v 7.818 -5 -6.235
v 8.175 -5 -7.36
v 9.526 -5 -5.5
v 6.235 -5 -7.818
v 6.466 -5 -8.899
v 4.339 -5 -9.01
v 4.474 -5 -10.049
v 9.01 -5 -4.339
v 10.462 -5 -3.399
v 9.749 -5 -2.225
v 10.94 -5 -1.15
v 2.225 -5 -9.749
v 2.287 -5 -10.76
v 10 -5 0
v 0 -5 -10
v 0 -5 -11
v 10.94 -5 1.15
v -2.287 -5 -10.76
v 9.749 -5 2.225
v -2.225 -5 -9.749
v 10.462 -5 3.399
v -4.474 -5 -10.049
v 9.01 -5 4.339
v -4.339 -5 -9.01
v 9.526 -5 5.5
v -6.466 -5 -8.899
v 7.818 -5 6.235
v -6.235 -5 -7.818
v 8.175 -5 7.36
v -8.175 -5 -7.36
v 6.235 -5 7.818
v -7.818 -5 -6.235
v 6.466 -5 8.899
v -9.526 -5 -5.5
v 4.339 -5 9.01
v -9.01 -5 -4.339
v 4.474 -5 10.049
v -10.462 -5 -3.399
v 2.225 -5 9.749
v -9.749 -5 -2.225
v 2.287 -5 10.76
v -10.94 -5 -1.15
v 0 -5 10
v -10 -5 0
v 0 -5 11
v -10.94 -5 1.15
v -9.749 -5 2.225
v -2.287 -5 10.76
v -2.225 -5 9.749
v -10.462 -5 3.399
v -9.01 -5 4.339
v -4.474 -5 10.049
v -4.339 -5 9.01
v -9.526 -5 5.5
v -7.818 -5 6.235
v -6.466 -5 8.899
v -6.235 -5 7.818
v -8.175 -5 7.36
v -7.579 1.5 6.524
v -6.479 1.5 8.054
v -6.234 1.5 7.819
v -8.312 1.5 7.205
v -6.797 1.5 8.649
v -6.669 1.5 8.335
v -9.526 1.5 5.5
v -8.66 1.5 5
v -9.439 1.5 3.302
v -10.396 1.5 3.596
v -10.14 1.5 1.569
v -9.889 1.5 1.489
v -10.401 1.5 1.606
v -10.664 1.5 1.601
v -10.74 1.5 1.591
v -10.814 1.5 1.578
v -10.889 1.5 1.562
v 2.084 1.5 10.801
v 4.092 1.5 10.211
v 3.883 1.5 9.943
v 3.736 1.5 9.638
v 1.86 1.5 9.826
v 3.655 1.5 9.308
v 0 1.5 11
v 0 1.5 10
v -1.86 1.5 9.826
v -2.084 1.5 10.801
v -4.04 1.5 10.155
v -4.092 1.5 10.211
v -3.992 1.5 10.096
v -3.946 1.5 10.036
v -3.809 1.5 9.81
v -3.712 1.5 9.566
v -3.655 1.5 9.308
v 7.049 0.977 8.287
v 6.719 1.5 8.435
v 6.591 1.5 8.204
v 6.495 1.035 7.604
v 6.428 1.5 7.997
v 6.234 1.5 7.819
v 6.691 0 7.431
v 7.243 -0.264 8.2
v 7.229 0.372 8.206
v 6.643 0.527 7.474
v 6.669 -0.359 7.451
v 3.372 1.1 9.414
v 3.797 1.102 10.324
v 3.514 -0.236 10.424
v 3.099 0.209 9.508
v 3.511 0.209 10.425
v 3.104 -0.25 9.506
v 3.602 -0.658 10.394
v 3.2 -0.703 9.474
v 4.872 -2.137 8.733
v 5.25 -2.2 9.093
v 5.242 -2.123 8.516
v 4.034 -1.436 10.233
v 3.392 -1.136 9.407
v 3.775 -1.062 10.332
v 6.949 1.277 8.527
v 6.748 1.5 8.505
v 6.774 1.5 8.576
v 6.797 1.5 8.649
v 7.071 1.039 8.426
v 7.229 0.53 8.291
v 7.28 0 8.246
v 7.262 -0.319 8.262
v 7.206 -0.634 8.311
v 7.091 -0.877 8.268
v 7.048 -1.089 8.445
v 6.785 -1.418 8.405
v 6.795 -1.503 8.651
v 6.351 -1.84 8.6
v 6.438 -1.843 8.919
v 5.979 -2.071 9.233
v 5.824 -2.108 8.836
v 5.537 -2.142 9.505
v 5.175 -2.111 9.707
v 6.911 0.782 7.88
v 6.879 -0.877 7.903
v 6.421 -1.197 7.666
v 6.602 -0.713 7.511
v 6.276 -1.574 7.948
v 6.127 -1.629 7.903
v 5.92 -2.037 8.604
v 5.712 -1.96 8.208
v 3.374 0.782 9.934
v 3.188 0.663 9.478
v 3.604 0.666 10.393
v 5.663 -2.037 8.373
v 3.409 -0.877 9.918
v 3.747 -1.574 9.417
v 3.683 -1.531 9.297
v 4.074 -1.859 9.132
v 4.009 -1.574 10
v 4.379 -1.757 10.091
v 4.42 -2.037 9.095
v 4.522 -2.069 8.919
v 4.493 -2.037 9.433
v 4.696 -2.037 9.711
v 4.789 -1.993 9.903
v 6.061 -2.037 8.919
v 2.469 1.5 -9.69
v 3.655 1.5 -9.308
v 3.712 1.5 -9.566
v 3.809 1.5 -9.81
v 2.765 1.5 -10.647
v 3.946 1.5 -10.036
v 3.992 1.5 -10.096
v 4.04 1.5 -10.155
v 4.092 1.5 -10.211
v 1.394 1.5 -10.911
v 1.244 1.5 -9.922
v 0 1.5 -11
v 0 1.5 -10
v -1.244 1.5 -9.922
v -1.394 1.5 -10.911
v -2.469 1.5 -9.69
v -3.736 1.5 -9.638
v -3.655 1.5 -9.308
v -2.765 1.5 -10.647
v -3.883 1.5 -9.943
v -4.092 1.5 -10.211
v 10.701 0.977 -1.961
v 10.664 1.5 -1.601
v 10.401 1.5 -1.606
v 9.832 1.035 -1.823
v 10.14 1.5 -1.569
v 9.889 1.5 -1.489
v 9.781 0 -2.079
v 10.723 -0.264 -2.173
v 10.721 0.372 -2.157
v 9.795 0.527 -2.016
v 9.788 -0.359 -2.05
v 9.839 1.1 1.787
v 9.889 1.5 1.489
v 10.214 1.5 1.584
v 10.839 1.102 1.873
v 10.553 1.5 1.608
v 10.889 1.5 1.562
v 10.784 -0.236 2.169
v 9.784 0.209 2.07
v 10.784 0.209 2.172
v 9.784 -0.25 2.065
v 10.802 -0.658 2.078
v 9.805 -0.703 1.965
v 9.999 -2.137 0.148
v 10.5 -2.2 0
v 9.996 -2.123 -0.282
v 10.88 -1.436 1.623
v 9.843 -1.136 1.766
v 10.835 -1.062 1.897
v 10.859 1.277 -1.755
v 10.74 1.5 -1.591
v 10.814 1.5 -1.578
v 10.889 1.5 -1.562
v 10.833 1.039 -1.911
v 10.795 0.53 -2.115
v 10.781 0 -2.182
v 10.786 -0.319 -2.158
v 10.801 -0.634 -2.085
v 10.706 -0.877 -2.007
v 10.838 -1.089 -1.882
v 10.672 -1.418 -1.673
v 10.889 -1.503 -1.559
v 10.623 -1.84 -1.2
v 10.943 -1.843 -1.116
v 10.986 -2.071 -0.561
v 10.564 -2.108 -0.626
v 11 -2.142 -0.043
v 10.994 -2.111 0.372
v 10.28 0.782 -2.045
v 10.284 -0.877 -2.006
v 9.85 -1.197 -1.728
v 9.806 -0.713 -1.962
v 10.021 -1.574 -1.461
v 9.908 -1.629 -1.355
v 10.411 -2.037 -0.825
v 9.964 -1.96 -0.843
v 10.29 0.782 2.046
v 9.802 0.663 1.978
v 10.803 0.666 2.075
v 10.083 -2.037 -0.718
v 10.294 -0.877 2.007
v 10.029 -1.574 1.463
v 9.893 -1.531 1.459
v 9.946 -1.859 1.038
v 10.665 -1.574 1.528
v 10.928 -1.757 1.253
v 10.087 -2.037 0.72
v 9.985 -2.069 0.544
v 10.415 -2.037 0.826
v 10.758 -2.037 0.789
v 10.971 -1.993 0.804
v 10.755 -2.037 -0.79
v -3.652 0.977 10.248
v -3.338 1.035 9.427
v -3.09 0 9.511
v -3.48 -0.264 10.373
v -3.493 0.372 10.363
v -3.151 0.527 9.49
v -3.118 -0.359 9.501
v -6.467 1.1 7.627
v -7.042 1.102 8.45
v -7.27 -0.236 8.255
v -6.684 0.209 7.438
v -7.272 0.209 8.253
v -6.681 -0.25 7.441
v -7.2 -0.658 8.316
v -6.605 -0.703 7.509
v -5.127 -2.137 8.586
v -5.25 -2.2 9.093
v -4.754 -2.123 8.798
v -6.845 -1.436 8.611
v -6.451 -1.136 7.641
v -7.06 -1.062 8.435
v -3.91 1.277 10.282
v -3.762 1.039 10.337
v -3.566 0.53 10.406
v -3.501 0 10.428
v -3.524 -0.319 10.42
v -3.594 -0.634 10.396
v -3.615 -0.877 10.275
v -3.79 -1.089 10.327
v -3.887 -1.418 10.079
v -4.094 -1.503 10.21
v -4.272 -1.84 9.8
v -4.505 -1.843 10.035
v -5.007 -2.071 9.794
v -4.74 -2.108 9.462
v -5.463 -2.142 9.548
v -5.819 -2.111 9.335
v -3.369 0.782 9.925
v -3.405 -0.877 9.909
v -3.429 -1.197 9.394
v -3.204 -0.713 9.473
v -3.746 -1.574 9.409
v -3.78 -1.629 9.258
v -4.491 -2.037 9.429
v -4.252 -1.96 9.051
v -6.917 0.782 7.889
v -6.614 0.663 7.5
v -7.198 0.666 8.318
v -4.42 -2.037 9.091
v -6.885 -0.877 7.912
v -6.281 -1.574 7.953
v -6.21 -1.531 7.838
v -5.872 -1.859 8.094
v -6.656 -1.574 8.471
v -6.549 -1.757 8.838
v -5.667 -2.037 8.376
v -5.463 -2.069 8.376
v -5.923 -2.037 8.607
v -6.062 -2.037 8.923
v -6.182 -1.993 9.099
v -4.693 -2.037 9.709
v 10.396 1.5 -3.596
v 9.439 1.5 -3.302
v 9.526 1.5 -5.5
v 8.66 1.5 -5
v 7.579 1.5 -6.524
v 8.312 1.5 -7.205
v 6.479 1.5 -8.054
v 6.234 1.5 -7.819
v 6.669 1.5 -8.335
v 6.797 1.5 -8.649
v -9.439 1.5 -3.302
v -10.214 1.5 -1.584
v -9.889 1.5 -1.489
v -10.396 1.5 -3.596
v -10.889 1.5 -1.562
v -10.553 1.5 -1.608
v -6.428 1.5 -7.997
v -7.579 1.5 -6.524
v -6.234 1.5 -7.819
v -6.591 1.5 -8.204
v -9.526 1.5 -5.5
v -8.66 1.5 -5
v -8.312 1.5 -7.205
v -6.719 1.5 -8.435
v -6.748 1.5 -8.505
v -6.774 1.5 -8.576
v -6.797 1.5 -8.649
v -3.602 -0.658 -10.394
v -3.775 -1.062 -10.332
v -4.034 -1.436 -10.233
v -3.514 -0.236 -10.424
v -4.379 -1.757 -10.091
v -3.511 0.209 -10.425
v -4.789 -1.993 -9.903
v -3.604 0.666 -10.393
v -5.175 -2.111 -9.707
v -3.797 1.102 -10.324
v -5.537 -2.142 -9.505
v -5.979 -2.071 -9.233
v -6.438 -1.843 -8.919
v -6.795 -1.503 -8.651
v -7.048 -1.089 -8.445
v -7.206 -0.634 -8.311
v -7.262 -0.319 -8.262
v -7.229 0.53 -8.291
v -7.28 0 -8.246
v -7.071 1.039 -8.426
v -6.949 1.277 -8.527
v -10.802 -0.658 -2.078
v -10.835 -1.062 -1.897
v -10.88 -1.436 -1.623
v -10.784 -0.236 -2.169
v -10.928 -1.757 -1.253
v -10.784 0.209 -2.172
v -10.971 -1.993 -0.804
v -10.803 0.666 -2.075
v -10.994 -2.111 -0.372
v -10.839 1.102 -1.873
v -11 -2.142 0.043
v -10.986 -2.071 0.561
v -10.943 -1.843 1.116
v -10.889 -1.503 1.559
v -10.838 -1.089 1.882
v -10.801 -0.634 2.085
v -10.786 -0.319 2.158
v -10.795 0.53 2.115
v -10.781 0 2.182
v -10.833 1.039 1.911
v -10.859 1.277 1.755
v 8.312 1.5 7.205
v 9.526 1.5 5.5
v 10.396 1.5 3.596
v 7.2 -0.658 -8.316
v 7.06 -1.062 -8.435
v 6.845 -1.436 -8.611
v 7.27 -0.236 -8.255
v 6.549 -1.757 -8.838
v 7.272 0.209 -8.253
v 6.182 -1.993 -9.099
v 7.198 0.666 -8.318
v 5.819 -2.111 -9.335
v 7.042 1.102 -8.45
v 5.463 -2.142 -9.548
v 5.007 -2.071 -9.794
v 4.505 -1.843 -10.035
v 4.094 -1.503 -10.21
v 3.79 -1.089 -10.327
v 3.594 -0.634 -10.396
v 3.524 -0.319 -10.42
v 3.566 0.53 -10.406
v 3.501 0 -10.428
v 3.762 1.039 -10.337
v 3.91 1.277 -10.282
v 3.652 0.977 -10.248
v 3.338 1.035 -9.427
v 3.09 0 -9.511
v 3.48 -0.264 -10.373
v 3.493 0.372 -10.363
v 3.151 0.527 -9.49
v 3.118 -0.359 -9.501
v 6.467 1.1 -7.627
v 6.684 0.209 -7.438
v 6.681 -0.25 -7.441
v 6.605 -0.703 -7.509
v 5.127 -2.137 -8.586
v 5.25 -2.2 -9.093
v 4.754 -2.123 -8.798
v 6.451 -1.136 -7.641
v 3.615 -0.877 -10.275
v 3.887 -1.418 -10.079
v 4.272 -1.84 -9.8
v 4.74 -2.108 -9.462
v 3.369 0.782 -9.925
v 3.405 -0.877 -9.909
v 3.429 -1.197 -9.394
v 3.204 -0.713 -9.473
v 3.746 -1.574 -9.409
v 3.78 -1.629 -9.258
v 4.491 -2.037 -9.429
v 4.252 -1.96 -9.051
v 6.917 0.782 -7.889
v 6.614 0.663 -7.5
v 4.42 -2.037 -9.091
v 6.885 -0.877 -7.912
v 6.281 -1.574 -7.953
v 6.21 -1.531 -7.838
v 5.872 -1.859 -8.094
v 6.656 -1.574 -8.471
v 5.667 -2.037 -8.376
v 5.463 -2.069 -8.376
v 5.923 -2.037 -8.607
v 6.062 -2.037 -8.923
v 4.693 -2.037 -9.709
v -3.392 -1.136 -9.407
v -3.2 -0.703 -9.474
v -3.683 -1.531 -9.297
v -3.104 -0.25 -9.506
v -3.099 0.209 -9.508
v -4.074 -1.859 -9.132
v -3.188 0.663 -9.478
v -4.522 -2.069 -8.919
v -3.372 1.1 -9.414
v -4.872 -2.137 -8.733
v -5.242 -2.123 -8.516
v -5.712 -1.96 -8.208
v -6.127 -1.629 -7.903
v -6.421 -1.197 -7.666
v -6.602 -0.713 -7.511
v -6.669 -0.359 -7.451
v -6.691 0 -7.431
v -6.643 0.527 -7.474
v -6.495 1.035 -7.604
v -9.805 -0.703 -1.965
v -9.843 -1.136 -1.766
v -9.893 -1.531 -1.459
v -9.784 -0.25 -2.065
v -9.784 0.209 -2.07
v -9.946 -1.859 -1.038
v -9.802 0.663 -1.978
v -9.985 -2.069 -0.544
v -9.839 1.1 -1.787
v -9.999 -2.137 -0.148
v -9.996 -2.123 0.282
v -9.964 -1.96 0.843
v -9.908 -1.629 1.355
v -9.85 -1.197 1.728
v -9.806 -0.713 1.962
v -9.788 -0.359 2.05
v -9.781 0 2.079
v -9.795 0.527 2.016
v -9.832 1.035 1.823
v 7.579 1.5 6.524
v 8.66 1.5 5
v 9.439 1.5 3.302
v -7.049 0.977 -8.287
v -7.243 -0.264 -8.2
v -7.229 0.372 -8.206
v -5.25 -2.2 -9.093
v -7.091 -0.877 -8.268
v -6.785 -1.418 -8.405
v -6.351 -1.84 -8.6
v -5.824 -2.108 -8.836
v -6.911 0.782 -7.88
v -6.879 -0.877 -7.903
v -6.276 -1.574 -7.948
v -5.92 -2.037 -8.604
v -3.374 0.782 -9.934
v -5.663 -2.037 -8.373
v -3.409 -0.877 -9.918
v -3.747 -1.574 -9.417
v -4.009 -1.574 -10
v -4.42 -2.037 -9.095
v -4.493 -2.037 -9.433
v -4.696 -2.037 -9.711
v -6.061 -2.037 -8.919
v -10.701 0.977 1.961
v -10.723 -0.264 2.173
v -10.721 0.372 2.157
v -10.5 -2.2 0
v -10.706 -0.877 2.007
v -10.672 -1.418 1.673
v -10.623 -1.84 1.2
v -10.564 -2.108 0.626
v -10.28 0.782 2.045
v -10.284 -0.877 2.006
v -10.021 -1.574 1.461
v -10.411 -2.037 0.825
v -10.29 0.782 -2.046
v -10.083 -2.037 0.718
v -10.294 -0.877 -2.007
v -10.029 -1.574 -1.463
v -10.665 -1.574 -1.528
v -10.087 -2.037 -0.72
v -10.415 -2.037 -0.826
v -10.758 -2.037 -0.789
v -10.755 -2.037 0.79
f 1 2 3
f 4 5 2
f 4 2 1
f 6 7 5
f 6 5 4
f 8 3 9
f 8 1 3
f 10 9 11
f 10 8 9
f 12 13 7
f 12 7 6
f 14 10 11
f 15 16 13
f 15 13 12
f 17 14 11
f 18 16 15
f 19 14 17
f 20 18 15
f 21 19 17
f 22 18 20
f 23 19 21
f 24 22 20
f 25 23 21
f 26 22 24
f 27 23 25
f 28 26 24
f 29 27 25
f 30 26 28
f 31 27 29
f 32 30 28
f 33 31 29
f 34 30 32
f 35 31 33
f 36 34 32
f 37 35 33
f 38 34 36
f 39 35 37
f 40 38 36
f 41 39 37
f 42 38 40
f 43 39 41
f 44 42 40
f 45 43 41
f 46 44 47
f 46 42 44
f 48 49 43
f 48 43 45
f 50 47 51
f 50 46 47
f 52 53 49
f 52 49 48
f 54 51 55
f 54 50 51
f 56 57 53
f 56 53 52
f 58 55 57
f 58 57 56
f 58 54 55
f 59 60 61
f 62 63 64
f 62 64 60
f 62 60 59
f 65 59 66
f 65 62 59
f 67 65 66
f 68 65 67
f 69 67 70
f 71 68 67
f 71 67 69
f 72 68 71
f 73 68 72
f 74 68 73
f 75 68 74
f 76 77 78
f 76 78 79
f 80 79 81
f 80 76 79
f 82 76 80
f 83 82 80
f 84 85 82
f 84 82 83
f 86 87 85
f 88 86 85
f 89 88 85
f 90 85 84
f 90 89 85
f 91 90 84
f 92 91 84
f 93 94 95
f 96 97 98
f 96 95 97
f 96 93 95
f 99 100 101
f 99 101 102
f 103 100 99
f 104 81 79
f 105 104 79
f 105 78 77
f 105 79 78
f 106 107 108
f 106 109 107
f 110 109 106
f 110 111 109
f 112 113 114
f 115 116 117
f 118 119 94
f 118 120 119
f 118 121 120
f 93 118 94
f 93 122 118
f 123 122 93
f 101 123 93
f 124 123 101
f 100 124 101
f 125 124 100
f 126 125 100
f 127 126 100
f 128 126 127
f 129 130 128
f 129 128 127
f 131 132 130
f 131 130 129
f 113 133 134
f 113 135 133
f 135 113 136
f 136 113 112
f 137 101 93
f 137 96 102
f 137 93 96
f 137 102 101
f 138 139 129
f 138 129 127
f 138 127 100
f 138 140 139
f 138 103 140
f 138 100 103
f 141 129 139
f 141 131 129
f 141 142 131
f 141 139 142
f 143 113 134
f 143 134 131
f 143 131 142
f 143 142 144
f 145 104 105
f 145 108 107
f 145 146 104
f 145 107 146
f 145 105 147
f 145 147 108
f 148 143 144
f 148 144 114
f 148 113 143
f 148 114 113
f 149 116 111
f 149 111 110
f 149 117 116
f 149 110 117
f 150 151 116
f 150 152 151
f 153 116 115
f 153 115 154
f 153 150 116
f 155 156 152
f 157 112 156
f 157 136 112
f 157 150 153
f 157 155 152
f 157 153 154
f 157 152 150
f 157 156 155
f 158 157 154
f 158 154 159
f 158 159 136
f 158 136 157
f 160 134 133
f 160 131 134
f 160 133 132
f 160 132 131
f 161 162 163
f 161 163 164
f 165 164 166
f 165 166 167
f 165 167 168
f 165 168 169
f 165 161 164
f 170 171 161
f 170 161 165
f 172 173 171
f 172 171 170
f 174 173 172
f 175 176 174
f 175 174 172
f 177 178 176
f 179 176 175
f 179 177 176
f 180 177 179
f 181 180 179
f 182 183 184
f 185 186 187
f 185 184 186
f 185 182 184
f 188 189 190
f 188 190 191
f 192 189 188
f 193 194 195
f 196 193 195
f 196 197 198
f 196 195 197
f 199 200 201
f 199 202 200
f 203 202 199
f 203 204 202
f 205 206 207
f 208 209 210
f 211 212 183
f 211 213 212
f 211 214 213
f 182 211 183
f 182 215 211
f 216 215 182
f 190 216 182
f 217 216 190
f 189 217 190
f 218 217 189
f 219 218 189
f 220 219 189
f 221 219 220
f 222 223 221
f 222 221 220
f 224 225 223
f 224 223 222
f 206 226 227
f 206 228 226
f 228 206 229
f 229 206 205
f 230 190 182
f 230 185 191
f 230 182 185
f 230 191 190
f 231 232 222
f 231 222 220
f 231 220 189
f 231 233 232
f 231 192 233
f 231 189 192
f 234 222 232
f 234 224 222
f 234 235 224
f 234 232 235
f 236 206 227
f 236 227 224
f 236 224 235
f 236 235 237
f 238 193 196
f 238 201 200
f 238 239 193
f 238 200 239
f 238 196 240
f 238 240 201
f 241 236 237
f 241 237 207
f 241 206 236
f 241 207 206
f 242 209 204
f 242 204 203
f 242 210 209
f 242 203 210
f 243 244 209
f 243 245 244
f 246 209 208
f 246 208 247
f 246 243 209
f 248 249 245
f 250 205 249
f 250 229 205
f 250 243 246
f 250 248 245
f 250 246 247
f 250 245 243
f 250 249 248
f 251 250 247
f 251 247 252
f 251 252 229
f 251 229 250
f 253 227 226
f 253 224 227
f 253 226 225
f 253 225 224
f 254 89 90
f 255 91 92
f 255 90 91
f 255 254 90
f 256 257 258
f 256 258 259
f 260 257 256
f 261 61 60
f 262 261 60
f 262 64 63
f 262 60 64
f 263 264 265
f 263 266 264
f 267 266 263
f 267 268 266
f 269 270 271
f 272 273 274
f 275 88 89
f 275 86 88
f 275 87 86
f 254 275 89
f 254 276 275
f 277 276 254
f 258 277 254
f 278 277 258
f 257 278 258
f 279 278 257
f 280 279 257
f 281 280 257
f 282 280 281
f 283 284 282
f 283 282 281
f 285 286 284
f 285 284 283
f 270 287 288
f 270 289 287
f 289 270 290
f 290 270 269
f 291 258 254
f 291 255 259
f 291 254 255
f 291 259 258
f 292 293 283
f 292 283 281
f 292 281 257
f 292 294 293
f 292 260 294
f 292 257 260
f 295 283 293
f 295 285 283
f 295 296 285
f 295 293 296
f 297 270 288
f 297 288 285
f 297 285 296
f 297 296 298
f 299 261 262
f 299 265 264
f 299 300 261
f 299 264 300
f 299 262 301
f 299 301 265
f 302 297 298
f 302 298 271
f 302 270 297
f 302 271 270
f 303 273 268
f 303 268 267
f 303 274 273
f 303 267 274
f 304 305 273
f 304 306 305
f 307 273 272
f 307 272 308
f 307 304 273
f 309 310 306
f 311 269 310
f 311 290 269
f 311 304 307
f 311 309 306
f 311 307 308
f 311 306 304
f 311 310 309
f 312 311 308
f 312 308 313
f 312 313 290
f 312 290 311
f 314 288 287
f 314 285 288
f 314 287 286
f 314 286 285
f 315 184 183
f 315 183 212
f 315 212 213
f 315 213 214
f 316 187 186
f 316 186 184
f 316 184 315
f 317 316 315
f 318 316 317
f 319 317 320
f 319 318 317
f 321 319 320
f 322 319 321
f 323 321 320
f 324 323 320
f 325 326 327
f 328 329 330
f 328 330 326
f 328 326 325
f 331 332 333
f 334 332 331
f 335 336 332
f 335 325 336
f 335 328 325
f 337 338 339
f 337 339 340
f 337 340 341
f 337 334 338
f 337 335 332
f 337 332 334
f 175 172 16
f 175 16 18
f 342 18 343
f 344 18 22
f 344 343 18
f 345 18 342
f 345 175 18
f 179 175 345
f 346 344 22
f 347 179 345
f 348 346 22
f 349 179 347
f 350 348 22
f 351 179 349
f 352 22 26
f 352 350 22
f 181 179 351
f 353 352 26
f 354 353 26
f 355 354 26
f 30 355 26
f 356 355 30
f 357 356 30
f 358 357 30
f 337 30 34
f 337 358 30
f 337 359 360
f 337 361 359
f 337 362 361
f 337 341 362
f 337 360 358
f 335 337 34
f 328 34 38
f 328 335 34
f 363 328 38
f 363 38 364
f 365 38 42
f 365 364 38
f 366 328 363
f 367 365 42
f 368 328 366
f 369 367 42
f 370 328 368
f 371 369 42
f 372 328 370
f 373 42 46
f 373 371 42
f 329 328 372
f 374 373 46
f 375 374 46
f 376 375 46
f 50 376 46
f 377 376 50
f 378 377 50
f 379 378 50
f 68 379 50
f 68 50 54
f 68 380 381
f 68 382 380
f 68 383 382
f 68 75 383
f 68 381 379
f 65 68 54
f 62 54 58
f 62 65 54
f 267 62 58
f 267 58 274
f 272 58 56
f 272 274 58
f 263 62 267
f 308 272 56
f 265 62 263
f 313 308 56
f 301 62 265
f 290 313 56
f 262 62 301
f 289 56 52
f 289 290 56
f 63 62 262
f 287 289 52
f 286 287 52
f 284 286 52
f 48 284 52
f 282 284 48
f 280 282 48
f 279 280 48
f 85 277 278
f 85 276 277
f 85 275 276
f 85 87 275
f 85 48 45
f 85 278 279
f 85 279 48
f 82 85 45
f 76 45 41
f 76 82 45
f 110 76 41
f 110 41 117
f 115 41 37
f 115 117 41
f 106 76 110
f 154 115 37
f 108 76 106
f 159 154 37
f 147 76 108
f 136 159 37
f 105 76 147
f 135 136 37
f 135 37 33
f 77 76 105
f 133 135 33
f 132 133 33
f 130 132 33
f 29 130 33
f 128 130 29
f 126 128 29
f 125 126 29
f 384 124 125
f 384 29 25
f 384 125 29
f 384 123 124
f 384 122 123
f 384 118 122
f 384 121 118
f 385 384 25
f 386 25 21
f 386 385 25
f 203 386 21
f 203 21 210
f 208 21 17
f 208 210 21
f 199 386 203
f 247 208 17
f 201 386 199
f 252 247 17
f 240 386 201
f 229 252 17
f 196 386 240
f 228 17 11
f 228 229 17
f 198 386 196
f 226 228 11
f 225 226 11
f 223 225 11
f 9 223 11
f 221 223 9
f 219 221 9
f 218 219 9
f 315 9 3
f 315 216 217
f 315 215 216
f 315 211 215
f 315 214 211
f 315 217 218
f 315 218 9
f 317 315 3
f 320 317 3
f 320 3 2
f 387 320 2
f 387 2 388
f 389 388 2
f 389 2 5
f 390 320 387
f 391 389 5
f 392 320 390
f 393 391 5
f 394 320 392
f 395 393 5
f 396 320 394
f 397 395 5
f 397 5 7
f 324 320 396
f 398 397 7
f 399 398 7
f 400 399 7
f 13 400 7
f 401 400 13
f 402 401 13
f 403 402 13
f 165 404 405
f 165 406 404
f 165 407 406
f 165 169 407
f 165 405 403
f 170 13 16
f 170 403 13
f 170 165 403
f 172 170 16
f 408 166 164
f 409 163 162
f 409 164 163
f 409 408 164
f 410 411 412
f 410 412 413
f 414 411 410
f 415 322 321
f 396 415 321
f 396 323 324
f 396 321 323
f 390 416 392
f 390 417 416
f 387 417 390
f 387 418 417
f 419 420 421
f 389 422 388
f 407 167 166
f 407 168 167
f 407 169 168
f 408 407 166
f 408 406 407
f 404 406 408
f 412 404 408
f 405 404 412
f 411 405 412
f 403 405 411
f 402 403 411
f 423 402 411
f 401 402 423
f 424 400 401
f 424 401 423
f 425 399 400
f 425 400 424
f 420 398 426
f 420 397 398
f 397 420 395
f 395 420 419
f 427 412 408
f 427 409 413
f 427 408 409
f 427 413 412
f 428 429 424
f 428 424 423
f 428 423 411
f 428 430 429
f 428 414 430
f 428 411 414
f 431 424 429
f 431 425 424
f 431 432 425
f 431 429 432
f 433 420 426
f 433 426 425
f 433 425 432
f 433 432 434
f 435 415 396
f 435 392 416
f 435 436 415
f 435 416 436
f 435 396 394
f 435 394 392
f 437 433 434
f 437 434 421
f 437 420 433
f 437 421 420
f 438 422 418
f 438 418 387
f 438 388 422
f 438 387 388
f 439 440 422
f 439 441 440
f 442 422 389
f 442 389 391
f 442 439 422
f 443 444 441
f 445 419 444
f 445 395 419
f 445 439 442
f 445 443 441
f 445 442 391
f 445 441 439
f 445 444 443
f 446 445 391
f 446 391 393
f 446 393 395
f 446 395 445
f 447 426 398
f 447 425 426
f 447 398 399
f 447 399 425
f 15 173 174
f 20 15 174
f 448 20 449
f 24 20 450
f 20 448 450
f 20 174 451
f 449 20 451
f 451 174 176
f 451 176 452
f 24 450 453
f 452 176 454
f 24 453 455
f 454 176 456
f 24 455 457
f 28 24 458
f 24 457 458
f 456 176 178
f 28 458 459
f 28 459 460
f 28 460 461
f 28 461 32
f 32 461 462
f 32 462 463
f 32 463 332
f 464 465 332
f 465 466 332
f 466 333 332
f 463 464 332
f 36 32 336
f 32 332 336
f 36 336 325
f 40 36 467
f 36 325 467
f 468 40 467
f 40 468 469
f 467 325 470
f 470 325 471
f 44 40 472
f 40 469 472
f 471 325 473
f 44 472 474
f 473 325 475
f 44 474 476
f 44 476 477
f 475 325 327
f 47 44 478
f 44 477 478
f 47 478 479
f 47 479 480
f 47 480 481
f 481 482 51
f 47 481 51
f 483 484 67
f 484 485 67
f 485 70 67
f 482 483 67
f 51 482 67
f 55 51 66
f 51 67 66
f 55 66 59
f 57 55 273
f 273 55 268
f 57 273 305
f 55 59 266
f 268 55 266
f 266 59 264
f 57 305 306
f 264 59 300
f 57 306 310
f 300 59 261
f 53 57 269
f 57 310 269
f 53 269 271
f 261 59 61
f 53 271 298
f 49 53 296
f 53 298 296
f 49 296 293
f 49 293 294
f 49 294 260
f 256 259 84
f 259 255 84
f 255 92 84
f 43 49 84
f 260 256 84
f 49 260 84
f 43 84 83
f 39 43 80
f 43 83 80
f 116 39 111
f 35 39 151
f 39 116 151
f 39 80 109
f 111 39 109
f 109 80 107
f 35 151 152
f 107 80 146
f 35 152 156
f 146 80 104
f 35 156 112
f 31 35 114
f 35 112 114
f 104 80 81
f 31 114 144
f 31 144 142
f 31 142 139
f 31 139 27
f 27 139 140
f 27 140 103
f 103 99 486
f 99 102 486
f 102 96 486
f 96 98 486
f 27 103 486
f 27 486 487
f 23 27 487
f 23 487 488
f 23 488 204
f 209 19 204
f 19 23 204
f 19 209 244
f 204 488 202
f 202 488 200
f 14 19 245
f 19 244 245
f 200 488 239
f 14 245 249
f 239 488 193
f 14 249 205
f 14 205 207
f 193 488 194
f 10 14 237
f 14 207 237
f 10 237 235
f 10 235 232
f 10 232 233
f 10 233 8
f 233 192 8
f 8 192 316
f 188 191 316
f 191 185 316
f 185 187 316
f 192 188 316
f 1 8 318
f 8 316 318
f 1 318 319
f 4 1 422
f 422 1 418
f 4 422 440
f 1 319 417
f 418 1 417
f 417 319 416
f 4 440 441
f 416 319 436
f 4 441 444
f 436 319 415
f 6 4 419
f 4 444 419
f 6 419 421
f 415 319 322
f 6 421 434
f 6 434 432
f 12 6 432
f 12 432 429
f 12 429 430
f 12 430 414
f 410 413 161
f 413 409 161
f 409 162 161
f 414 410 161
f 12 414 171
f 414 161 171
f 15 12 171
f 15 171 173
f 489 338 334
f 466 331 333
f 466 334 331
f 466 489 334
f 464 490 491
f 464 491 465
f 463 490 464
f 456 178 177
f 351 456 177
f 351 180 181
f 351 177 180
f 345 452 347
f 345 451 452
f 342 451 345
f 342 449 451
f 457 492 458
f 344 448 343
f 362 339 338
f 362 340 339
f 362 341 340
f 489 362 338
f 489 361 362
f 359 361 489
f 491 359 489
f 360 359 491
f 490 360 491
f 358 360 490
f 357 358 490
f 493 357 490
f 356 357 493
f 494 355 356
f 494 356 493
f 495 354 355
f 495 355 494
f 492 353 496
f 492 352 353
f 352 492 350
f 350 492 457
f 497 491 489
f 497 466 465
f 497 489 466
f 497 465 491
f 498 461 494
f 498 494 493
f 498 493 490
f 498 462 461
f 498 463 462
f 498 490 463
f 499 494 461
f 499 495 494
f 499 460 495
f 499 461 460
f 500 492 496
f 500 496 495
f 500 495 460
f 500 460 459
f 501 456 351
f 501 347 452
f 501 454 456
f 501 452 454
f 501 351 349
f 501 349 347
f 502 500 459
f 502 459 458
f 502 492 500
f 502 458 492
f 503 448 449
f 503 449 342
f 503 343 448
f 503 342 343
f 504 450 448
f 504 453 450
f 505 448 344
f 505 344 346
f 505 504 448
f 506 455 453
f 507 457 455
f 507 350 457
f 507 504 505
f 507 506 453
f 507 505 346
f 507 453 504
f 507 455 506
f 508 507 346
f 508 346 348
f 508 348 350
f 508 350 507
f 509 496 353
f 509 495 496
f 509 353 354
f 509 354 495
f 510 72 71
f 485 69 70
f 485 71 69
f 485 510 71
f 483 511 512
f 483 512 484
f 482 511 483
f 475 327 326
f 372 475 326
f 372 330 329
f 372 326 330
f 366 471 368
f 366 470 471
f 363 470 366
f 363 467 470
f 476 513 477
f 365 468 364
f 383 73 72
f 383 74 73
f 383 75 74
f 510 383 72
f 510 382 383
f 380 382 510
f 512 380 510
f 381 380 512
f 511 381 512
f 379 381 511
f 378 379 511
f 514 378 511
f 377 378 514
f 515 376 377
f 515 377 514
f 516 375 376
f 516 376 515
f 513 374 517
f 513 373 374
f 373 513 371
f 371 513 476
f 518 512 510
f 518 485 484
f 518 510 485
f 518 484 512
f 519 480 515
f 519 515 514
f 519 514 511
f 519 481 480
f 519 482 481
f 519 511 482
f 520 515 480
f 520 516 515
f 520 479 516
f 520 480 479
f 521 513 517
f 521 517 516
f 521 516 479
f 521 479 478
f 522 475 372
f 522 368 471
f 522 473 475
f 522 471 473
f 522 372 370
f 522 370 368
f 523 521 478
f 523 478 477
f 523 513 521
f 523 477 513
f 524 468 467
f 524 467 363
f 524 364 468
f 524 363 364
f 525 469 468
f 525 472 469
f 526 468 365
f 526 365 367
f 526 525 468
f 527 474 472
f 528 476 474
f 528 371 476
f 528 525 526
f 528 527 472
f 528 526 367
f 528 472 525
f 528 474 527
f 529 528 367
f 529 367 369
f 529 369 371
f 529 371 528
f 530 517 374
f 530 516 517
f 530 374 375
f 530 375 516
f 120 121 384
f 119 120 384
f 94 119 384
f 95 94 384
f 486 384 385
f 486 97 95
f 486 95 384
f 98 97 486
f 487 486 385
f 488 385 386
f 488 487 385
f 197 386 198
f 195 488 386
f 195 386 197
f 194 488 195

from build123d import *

# Parameters (mm, degrees)
SKETCH3_W          = 1
SKETCH3_H          = 10
CIRPATTERN1_COUNT  = 6
SKETCH5_R          = 11
SKETCH5_R_2        = 10
CUT_EXTRUDE1_DEPTH = 3.5


with BuildPart() as part:
    # Sketch3 → Revolve3 (revolve)
    with BuildSketch(Plane.XY):
        with Locations((10.5, 0)):
            Rectangle(SKETCH3_W, SKETCH3_H)
    revolve(axis=Axis((0, 0, 0), (0, 1, 0)))

    # Sketch4 → Cut-Revolve1 (revolve, cut)
    with BuildSketch(Plane.XY):
        with BuildLine():
            Line((10.5, 2.2), (10.5, -2.2))
            ThreePointArc((10.5, -2.2), (12.055634919, -1.555634919), (12.7, 0))
            ThreePointArc((12.7, 0), (12.055634919, 1.555634919), (10.5, 2.2))
        make_face()
    cut_revolve1 = revolve(axis=Axis((10.5, -2.2, 0), (0, 1, 0)), mode=Mode.SUBTRACT)

    # CirPattern1: Cut-Revolve1 ×6 about axis
    cirpattern1_axis = Axis((0, 5, 0), (0, -1, 0))
    for i in range(1, CIRPATTERN1_COUNT):
        add(cut_revolve1.rotate(cirpattern1_axis, i * 360 / CIRPATTERN1_COUNT), mode=Mode.SUBTRACT)

    # Sketch5 → Cut-Extrude1 (cut)
    with BuildSketch(Plane(origin=(0, 5, 0), x_dir=(1, 0, 0), z_dir=(0, 1, 0))):
        Circle(SKETCH5_R)
        Circle(SKETCH5_R_2, mode=Mode.SUBTRACT)
    extrude(amount=-CUT_EXTRUDE1_DEPTH, mode=Mode.SUBTRACT)


solid = part.part
